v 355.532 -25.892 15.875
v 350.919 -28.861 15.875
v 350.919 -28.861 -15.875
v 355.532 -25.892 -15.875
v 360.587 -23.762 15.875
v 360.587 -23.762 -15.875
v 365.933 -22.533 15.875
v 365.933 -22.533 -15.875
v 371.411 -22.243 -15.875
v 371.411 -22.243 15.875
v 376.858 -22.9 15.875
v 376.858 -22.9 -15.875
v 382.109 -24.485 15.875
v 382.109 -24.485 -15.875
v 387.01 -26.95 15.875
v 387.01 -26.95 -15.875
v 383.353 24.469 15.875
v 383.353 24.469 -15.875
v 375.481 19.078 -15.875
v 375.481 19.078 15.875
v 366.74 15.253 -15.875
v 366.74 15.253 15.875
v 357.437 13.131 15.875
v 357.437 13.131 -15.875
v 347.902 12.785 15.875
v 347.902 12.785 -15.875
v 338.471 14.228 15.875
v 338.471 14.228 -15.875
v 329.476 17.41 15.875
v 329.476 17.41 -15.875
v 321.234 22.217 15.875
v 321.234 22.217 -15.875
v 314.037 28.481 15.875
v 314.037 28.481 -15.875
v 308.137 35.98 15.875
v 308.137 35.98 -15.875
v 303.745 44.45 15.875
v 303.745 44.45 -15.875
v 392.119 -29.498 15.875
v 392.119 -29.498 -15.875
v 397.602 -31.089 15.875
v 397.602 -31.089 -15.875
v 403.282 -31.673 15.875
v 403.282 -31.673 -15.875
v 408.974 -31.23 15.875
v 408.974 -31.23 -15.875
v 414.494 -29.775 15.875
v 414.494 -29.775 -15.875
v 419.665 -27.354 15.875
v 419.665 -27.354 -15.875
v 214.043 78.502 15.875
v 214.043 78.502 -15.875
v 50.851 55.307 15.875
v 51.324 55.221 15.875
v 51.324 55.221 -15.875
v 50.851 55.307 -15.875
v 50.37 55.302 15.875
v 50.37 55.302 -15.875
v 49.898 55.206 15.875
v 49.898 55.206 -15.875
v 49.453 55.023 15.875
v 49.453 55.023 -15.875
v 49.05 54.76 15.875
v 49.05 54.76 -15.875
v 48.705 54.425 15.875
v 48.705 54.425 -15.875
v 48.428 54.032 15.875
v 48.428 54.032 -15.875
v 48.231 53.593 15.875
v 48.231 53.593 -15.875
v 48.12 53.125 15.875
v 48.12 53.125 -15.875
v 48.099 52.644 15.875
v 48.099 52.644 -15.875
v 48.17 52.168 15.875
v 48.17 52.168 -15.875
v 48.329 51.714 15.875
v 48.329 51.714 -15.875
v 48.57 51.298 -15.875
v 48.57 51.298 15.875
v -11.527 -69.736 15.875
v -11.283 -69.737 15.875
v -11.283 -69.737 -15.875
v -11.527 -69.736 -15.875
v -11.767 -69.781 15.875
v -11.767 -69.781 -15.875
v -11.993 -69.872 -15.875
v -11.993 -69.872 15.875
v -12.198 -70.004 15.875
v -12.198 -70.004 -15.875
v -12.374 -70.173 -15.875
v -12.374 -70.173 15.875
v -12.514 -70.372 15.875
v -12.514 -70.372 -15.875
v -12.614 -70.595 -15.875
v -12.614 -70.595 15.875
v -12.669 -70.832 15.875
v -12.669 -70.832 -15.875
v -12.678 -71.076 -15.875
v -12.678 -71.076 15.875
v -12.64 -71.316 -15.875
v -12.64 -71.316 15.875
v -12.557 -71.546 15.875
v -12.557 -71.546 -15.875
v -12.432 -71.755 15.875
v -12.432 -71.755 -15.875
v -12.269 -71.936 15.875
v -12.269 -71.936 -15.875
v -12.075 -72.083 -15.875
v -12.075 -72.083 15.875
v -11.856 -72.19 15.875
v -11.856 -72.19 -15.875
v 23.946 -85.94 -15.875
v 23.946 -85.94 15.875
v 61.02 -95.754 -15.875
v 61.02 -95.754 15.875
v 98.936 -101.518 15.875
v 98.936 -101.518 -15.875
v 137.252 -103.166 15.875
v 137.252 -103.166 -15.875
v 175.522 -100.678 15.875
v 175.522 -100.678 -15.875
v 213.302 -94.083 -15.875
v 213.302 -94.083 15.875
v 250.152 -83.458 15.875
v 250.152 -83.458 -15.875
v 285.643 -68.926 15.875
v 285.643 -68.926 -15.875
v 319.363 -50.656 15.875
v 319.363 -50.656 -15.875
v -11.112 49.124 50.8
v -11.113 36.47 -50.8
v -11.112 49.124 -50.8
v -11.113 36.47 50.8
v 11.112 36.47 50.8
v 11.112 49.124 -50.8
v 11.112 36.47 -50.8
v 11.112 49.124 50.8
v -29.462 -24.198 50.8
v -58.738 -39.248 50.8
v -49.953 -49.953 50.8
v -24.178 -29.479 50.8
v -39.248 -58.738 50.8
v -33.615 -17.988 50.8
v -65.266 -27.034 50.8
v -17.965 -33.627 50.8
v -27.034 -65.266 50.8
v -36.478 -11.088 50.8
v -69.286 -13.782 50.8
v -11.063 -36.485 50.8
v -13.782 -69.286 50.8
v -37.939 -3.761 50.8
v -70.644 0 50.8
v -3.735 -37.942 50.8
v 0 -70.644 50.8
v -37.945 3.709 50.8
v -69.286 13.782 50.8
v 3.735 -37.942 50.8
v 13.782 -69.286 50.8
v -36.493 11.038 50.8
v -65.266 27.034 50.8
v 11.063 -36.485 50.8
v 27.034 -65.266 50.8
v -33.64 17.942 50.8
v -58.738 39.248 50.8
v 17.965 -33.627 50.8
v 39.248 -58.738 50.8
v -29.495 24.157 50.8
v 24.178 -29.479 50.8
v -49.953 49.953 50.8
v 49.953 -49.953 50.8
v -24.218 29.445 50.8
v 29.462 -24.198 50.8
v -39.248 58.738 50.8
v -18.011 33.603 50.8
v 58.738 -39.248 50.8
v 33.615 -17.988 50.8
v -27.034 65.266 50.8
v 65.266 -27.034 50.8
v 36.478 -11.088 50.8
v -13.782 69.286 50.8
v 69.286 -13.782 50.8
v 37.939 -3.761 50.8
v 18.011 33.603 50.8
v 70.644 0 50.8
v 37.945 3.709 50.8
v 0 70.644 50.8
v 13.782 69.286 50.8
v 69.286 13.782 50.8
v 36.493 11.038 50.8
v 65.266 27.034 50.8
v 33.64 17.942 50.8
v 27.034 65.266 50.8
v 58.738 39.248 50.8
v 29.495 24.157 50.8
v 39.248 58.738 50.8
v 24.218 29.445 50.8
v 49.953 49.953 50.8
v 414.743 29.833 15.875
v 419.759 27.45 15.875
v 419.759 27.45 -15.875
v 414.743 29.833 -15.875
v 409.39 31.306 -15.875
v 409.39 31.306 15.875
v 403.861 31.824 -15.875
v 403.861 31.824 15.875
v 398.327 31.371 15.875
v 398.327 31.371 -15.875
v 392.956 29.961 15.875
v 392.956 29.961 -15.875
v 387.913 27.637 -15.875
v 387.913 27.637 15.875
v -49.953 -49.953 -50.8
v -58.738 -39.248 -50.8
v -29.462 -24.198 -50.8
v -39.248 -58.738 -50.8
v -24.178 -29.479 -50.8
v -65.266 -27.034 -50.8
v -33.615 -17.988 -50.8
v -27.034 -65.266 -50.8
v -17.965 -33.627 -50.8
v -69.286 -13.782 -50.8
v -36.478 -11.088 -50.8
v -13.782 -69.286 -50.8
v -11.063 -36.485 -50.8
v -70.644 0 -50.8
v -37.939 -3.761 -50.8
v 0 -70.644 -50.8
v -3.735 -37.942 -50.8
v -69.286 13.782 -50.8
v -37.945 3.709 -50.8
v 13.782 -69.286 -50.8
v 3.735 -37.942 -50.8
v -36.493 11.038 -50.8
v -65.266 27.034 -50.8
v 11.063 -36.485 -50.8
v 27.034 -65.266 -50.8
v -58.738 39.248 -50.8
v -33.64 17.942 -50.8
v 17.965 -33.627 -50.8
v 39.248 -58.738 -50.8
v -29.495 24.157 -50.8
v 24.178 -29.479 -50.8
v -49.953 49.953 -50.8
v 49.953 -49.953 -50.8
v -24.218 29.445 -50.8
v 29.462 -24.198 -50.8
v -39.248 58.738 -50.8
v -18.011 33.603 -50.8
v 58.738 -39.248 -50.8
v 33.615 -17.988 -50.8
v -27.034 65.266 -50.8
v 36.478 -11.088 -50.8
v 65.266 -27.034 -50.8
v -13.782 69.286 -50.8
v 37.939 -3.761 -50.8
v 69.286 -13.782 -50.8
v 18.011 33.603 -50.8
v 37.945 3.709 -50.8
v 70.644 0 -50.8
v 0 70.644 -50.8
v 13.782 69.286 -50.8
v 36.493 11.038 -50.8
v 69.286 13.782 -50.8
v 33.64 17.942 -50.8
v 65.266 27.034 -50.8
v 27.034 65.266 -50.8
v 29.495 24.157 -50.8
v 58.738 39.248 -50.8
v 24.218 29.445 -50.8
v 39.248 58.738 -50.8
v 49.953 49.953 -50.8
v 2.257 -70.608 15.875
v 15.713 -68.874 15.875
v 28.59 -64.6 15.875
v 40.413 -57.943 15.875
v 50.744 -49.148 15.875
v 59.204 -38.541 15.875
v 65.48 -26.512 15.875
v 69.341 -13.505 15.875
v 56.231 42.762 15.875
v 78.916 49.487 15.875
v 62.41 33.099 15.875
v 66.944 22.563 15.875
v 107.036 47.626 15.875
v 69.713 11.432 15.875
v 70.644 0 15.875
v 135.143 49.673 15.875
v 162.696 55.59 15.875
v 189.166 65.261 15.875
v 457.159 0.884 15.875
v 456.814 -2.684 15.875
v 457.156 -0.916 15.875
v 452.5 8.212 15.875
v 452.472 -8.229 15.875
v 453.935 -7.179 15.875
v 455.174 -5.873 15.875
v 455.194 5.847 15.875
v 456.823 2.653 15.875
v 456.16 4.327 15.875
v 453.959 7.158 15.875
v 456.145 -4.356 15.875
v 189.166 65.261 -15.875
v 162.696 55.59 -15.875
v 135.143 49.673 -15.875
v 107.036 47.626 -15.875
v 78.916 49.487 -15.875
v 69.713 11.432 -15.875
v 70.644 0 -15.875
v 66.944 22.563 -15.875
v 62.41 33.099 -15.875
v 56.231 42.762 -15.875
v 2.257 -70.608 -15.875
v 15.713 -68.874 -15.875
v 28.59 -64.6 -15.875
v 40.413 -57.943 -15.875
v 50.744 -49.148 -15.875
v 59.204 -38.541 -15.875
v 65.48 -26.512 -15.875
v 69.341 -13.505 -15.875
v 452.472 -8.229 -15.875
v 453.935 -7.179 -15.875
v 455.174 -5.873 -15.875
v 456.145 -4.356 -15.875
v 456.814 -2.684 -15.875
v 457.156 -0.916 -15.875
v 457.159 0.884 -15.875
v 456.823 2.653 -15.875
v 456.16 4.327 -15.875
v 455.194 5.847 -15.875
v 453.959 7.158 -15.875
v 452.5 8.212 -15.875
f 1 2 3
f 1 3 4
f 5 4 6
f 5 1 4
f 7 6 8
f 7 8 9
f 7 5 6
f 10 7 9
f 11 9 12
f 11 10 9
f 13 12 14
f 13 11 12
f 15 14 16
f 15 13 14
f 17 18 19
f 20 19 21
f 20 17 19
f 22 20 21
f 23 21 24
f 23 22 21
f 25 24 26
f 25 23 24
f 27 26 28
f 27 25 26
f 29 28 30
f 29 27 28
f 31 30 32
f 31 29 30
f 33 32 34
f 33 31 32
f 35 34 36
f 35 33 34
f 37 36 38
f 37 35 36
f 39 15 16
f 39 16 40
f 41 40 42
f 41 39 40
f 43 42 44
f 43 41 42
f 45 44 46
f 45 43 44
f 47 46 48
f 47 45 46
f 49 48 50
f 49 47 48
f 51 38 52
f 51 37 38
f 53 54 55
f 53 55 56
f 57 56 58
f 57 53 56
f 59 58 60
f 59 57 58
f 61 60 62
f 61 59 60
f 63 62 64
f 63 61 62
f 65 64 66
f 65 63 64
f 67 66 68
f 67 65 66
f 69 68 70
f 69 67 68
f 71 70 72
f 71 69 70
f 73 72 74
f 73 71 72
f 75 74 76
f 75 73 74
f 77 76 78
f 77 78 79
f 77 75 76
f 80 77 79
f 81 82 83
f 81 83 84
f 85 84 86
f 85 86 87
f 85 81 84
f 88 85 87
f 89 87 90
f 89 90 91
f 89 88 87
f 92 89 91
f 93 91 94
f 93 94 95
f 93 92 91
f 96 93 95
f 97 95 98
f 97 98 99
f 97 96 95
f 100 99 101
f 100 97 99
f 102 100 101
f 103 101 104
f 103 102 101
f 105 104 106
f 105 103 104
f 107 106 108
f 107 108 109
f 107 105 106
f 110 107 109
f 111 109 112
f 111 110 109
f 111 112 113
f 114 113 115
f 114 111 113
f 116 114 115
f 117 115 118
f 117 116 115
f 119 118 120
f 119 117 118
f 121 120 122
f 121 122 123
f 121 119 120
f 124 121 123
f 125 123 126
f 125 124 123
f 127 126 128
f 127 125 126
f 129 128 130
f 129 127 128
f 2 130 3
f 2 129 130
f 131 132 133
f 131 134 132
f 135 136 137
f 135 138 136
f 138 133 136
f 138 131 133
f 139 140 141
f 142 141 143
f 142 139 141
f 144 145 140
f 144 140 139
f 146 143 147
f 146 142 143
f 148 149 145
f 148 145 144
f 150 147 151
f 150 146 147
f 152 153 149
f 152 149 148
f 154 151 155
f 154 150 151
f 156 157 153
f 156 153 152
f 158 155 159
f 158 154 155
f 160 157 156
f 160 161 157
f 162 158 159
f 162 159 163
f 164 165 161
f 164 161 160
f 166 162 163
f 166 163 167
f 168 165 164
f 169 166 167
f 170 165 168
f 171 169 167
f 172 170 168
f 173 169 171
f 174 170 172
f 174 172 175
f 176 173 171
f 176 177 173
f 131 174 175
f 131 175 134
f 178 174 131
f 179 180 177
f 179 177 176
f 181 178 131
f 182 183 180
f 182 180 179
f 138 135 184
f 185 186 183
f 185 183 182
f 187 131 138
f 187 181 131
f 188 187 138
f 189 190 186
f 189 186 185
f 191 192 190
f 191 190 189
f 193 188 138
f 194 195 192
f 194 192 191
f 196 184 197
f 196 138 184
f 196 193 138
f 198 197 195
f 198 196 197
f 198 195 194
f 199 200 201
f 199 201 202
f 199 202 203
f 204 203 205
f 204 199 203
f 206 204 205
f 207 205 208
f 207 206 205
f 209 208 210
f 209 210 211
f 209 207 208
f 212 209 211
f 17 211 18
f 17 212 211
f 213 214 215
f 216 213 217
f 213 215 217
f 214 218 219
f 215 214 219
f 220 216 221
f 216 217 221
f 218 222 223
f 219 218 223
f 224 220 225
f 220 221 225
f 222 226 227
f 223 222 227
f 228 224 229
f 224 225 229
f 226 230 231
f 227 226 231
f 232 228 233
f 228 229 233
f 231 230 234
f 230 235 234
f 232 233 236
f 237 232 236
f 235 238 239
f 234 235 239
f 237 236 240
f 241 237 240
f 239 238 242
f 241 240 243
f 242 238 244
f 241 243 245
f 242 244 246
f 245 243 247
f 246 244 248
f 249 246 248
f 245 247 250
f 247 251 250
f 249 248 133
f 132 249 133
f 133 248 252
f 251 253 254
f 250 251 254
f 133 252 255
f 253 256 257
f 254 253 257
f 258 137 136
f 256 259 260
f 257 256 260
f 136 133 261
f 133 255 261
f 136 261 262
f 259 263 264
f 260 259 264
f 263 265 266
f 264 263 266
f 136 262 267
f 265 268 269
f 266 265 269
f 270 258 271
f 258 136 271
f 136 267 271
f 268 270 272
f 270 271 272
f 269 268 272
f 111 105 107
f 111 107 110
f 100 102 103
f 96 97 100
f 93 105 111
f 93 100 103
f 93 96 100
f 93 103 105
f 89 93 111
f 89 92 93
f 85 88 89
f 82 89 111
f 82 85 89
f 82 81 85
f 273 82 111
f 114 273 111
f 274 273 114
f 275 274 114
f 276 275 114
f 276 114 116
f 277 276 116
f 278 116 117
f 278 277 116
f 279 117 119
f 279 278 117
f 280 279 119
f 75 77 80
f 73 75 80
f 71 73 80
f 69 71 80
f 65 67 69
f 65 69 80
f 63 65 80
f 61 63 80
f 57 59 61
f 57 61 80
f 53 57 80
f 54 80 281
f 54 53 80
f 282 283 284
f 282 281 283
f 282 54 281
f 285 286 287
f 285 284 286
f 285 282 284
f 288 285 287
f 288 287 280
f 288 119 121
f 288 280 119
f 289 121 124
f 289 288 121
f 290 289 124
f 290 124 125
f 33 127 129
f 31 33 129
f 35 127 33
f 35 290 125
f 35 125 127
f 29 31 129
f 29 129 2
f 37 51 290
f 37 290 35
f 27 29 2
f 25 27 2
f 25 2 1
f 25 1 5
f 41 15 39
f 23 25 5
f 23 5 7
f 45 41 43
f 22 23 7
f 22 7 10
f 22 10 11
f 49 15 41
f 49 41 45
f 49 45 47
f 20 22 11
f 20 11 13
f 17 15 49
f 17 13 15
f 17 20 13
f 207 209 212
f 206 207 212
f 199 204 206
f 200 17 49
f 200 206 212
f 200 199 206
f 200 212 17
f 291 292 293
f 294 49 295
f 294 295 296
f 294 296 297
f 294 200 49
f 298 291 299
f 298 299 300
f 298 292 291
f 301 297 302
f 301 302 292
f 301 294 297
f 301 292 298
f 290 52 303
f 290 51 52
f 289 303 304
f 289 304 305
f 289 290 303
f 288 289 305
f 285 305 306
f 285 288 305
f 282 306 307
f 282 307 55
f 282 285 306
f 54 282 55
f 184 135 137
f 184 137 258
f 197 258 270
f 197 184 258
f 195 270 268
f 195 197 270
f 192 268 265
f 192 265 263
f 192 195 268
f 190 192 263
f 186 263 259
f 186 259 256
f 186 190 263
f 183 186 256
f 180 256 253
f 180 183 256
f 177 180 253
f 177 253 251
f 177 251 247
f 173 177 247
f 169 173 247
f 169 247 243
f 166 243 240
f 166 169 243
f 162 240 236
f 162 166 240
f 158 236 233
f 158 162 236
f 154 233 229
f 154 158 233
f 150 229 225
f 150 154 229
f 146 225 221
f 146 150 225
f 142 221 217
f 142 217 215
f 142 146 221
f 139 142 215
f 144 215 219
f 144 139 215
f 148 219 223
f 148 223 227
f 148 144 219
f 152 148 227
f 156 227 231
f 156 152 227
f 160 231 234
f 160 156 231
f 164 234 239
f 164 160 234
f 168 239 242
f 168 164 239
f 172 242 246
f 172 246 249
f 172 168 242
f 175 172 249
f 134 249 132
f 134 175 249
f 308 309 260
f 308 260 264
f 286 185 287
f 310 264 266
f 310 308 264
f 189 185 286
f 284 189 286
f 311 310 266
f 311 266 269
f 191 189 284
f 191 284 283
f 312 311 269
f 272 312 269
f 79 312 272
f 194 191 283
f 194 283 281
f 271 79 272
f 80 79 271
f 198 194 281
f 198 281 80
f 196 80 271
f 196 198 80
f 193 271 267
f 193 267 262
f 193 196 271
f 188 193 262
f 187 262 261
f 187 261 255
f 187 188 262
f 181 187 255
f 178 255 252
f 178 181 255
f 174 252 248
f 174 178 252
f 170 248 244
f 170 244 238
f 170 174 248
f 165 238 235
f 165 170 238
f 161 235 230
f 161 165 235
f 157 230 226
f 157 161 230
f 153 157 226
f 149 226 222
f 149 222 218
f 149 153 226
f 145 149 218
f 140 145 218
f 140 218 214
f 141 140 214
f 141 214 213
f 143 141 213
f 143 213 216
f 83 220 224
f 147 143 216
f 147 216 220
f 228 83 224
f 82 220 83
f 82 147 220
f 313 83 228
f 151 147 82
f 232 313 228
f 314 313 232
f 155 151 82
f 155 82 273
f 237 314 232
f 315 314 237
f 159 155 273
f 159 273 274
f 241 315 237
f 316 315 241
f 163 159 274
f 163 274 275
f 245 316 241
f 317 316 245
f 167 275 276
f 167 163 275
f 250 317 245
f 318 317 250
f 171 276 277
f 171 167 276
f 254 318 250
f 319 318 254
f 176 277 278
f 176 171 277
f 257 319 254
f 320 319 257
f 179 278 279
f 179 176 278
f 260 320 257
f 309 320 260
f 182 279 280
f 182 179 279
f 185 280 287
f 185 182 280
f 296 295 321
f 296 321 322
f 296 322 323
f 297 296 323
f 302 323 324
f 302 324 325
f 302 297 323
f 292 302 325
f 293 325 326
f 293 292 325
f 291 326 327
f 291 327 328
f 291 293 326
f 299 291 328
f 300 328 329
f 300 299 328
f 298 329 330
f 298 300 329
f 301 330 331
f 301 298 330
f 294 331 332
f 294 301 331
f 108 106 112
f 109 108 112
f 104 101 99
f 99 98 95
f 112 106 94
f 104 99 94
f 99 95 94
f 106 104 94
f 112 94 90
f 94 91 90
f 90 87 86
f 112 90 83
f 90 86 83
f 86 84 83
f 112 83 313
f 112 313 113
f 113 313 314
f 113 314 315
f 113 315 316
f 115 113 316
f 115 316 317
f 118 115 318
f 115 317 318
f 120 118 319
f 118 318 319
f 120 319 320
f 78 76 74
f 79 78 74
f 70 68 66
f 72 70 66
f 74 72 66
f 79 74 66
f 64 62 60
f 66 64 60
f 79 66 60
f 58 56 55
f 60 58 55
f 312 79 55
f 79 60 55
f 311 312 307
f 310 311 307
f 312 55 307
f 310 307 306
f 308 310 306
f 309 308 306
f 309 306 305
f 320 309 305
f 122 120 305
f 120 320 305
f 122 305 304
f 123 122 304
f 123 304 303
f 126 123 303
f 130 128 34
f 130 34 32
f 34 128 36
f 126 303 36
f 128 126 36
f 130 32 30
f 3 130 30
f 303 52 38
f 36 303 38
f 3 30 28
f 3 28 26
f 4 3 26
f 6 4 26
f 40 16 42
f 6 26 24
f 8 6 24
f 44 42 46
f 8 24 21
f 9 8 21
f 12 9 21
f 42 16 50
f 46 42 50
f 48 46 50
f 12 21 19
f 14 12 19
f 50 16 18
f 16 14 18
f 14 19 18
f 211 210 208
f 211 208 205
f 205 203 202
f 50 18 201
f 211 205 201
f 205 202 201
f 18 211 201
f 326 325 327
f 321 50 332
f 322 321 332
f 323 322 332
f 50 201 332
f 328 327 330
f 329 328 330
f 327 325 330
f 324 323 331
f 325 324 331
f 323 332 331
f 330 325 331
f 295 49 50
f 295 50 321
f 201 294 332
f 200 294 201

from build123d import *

# Parameters (mm, degrees)
F1_DEPTH = 15.875
F2_R     = 70.64375
F3_DEPTH = 50.8


with BuildPart() as f1:
    # F0 (on Top) → F1 (new body, symmetric)
    with BuildSketch(Plane.XY):
        with BuildLine():
            ThreePointArc((214.0429582689, 78.5021666116), (135.1426887504, 49.6734632535), (51.3239932557, 55.2208007216))
            ThreePointArc((51.3239932557, 55.2208007216), (48.3240107377, 53.8275326792), (49.2448874204, 50.6505723267))
            ThreePointArc((49.2448874204, 50.6505723267), (63.1490502428, -31.6660207082), (-11.1351814225, -69.7606418315))
            ThreePointArc((-11.1351814225, -69.7606418315), (-12.6279755061, -70.6394230316), (-11.8555099032, -72.1899027849))
            ThreePointArc((-11.8555099032, -72.1899027849), (175.5219606246, -100.6779781173), (350.9193591325, -28.8612704918))
            ThreePointArc((350.9193591325, -28.8612704918), (368.6661659856, -22.2694269513), (387.009926427, -26.9500260171))
            ThreePointArc((387.009926427, -26.9500260171), (403.281578789, -31.6726186916), (419.6651697435, -27.3543436198))
            Line((419.6651697435, -27.3543436198), (452.4721534977, -8.2287874757))
            ThreePointArc((452.4721534977, -8.2287874757), (457.1999861821, -0.0162243816), (452.5001585836, 8.212397314))
            Line((452.5001585836, 8.212397314), (419.75852003, 27.4496056792))
            ThreePointArc((419.75852003, 27.4496056792), (401.084074029, 31.7190844567), (383.352674206, 24.4691987482))
            ThreePointArc((383.352674206, 24.4691987482), (338.4707971933, 14.2282569652), (303.7446396069, 44.45))
            Line((303.7446396069, 44.45), (214.0429582689, 78.5021666116))
        make_face()
    extrude(amount=F1_DEPTH, both=True)

    # F2 (on Top) → F3 (join, symmetric)
    with BuildSketch(Plane.XY):
        Circle(F2_R)
        with BuildLine():
            ThreePointArc((11.1125, 36.46996667), (0, -38.1254), (-11.1125, 36.46996667))
            Line((-11.1125, 36.46996667), (-11.1125, 49.1236))
            Line((-11.1125, 49.1236), (11.1125, 49.1236))
            Line((11.1125, 49.1236), (11.1125, 36.46996667))
        make_face(mode=Mode.SUBTRACT)
    extrude(amount=F3_DEPTH, both=True)


solid = f1.part
